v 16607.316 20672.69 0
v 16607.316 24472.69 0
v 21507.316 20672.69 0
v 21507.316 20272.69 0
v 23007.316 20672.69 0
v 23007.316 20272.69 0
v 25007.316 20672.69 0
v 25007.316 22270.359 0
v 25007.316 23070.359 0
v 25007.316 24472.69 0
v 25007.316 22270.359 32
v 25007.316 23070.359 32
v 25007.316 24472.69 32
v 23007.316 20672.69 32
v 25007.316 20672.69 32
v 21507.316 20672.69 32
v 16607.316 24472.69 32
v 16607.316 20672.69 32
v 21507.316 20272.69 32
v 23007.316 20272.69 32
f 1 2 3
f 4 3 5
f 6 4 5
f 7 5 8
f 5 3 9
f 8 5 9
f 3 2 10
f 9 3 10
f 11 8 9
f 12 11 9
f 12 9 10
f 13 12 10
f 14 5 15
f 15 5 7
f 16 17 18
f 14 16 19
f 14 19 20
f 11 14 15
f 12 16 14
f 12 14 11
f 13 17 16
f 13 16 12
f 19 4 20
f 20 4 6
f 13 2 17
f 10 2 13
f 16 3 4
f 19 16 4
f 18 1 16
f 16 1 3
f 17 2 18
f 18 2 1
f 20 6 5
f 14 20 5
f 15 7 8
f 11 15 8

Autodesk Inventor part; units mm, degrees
ref_plane "YZ Plane" through (0, 0, 0) normal (1, 0, 0) x (0, 1, 0)
ref_plane "XZ Plane" through (0, 0, 0) normal (0, 1, 0) x (-1, 0, 0)
ref_plane "XY Plane" through (0, 0, 0) normal (0, 0, 1) x (1, 0, 0)
sketch "Эскиз1" plane through (0, 0, 0) normal (0, 0, 1) x (1, 0, 0)
  line L0 (23007.3162, 20272.69) -> (23007.3162, 20672.69) construction
  line L1 (25007.3162, 20672.69) -> (23007.3162, 20672.69) construction
  line L2 (25007.3162, 20272.69) -> (25007.3162, 20672.69) construction
  line L3 (23007.3162, 20272.69) -> (25007.3162, 20272.69) construction
  line L4 (21507.3162, 20672.69) -> (21507.3162, 20272.69) construction
  line L5 (19507.3162, 20272.69) -> (21507.3162, 20272.69) construction
  line L6 (19507.3162, 20672.69) -> (19507.3162, 20272.69) construction
  line L7 (21507.3162, 20672.69) -> (19507.3162, 20672.69) construction
  line L8 (28307.3162, 15072.69) -> (28307.3162, 14672.69) construction
  line L9 (27607.3162, 14672.69) -> (28307.3162, 14672.69) construction
  line L10 (27607.3162, 15072.69) -> (27607.3162, 14672.69) construction
  line L11 (26657.3162, 15072.69) -> (27607.3162, 15072.69) construction
  line L12 (26657.3162, 15072.69) -> (26657.3162, 15472.69) construction
  line L13 (27607.3162, 15472.69) -> (26657.3162, 15472.69) construction
  line L14 (27607.3162, 23072.69) -> (27607.3162, 15472.69) construction
  line L15 (25407.3162, 23072.69) -> (27607.3162, 23072.69) construction
  line L16 (25407.3162, 20072.69) -> (25407.3162, 23072.69) construction
  line L17 (25407.3162, 20072.69) -> (25007.3162, 20072.69) construction
  line L18 (25007.3162, 14072.69) -> (25007.3162, 17872.69) construction
  line L19 (25007.3162, 24472.69) -> (16607.3162, 24472.69) construction
  line L20 (16607.3162, 24472.69) -> (16607.3162, 20672.69) construction
  line L21 (19507.3162, 20672.69) -> (16607.3162, 20672.69) construction
  line L22 (19507.3162, 20272.69) -> (19507.3162, 20672.69) construction
  line L23 (16607.3162, 20272.69) -> (19507.3162, 20272.69) construction
  line L24 (16607.3162, 20272.69) -> (16607.3162, 18272.69) construction
  line L25 (19607.3162, 18272.69) -> (16607.3162, 18272.69) construction
  line L26 (19607.3162, 18272.69) -> (19607.3162, 17872.69) construction
  line L27 (16607.3162, 17872.69) -> (19607.3162, 17872.69) construction
  line L28 (16607.3162, 17872.69) -> (16607.3162, 14072.69) construction
  line L29 (16607.3162, 14072.69) -> (25007.3162, 14072.69) construction
  line L30 (23857.3162, 17872.69) -> (25007.3162, 17872.69) construction
  line L31 (23857.3162, 17872.69) -> (23857.3162, 18272.69) construction
  line L32 (25007.3162, 18272.69) -> (23857.3162, 18272.69) construction
  line L33 (25007.3162, 18272.69) -> (25007.3162, 18572.69) construction
  line L34 (25007.3162, 18572.69) -> (25407.3162, 18572.69) construction
  line L35 (25407.3162, 15472.69) -> (25407.3162, 18572.69) construction
  line L36 (25657.3162, 15472.69) -> (25407.3162, 15472.69) construction
  line L37 (25657.3162, 15472.69) -> (25657.3162, 15072.69) construction
  line L38 (25407.3162, 15072.69) -> (25657.3162, 15072.69) construction
  line L39 (25407.3162, 13672.69) -> (25407.3162, 15072.69) construction
  line L40 (16207.3162, 13672.69) -> (25407.3162, 13672.69) construction
  line L41 (16207.3162, 15072.69) -> (16207.3162, 13672.69) construction
  line L42 (15957.3162, 15072.69) -> (16207.3162, 15072.69) construction
  line L43 (15957.3162, 15072.69) -> (15957.3162, 15472.69) construction
  line L44 (16207.3162, 15472.69) -> (15957.3162, 15472.69) construction
  line L45 (16207.3162, 23472.69) -> (16207.3162, 15472.69) construction
  line L46 (14007.3162, 23472.69) -> (16207.3162, 23472.69) construction
  line L47 (14007.3162, 20472.69) -> (14007.3162, 23472.69) construction
  line L48 (14007.3162, 20472.69) -> (13607.3162, 20472.69) construction
  line L49 (13607.3162, 20472.69) -> (13607.3162, 23472.69) construction
  line L50 (13607.3162, 23472.69) -> (8007.3162, 23472.69) construction
  line L51 (8007.3162, 23472.69) -> (8007.3162, 15072.69) construction
  line L52 (8007.3162, 15072.69) -> (13607.3162, 15072.69) construction
  line L53 (13607.3162, 15072.69) -> (13607.3162, 18072.69) construction
  line L54 (13607.3162, 18072.69) -> (14007.3162, 18072.69) construction
  line L55 (14007.3162, 15472.69) -> (14007.3162, 18072.69) construction
  line L56 (14957.3162, 15472.69) -> (14007.3162, 15472.69) construction
  line L57 (14957.3162, 15472.69) -> (14957.3162, 15072.69) construction
  line L58 (14007.3162, 15072.69) -> (14957.3162, 15072.69) construction
  line L59 (14007.3162, 14672.69) -> (14007.3162, 15072.69) construction
  line L60 (7607.3162, 14672.69) -> (14007.3162, 14672.69) construction
  line L61 (7607.3162, 23872.69) -> (7607.3162, 14672.69) construction
  line L62 (16207.3162, 23872.69) -> (7607.3162, 23872.69) construction
  line L63 (16207.3162, 24872.69) -> (16207.3162, 23872.69) construction
  line L64 (25407.3162, 24872.69) -> (16207.3162, 24872.69) construction
  line L65 (25407.3162, 23472.69) -> (25407.3162, 24872.69) construction
  line L66 (27607.3162, 23472.69) -> (25407.3162, 23472.69) construction
  line L67 (27607.3162, 23872.69) -> (27607.3162, 23472.69) construction
  line L68 (29607.3162, 23872.69) -> (27607.3162, 23872.69) construction
  line L69 (29607.3162, 23872.69) -> (29607.3162, 23472.69) construction
  line L70 (29607.3162, 23472.69) -> (28007.3162, 23472.69) construction
  line L71 (28007.3162, 23472.69) -> (28007.3162, 15072.69) construction
  line L72 (28007.3162, 15072.69) -> (28307.3162, 15072.69) construction
  line L73 (25007.3162, 20672.69) -> (25007.3162, 24472.69)
  line L74 (16607.3162, 24472.69) -> (25007.3162, 24472.69)
  line L75 (16607.3162, 24472.69) -> (16607.3162, 20672.69)
  line L76 (16607.3162, 20672.69) -> (21507.3162, 20672.69)
  line L77 (21507.3162, 20672.69) -> (21507.3162, 20272.69)
  line L78 (21507.3162, 20272.69) -> (23007.3162, 20272.69)
  line L79 (23007.3162, 20272.69) -> (23007.3162, 20672.69)
  line L80 (23007.3162, 20672.69) -> (25007.3162, 20672.69)
  line L81 (25307.3162, 23070.3586) -> (25007.3162, 23070.3586) projected
  line L82 (25007.3162, 23070.3586) -> (25007.3162, 24472.69) projected
  line L83 (25007.3162, 20072.69) -> (25007.3162, 22270.3586) projected
  line L84 (25007.3162, 22270.3586) -> (25307.3162, 22270.3586) projected
  line L85 (25307.3162, 22270.3586) -> (25307.3162, 23070.3586) projected
  point P0 (0, 0)
extrude "Выдавливание1" add sketch "Эскиз1" along normal blind 32 contours L80 L79 L78 L77 L76 L75 L74 L73
properties part number "Пол гостиной" material "Деревянные полы"
